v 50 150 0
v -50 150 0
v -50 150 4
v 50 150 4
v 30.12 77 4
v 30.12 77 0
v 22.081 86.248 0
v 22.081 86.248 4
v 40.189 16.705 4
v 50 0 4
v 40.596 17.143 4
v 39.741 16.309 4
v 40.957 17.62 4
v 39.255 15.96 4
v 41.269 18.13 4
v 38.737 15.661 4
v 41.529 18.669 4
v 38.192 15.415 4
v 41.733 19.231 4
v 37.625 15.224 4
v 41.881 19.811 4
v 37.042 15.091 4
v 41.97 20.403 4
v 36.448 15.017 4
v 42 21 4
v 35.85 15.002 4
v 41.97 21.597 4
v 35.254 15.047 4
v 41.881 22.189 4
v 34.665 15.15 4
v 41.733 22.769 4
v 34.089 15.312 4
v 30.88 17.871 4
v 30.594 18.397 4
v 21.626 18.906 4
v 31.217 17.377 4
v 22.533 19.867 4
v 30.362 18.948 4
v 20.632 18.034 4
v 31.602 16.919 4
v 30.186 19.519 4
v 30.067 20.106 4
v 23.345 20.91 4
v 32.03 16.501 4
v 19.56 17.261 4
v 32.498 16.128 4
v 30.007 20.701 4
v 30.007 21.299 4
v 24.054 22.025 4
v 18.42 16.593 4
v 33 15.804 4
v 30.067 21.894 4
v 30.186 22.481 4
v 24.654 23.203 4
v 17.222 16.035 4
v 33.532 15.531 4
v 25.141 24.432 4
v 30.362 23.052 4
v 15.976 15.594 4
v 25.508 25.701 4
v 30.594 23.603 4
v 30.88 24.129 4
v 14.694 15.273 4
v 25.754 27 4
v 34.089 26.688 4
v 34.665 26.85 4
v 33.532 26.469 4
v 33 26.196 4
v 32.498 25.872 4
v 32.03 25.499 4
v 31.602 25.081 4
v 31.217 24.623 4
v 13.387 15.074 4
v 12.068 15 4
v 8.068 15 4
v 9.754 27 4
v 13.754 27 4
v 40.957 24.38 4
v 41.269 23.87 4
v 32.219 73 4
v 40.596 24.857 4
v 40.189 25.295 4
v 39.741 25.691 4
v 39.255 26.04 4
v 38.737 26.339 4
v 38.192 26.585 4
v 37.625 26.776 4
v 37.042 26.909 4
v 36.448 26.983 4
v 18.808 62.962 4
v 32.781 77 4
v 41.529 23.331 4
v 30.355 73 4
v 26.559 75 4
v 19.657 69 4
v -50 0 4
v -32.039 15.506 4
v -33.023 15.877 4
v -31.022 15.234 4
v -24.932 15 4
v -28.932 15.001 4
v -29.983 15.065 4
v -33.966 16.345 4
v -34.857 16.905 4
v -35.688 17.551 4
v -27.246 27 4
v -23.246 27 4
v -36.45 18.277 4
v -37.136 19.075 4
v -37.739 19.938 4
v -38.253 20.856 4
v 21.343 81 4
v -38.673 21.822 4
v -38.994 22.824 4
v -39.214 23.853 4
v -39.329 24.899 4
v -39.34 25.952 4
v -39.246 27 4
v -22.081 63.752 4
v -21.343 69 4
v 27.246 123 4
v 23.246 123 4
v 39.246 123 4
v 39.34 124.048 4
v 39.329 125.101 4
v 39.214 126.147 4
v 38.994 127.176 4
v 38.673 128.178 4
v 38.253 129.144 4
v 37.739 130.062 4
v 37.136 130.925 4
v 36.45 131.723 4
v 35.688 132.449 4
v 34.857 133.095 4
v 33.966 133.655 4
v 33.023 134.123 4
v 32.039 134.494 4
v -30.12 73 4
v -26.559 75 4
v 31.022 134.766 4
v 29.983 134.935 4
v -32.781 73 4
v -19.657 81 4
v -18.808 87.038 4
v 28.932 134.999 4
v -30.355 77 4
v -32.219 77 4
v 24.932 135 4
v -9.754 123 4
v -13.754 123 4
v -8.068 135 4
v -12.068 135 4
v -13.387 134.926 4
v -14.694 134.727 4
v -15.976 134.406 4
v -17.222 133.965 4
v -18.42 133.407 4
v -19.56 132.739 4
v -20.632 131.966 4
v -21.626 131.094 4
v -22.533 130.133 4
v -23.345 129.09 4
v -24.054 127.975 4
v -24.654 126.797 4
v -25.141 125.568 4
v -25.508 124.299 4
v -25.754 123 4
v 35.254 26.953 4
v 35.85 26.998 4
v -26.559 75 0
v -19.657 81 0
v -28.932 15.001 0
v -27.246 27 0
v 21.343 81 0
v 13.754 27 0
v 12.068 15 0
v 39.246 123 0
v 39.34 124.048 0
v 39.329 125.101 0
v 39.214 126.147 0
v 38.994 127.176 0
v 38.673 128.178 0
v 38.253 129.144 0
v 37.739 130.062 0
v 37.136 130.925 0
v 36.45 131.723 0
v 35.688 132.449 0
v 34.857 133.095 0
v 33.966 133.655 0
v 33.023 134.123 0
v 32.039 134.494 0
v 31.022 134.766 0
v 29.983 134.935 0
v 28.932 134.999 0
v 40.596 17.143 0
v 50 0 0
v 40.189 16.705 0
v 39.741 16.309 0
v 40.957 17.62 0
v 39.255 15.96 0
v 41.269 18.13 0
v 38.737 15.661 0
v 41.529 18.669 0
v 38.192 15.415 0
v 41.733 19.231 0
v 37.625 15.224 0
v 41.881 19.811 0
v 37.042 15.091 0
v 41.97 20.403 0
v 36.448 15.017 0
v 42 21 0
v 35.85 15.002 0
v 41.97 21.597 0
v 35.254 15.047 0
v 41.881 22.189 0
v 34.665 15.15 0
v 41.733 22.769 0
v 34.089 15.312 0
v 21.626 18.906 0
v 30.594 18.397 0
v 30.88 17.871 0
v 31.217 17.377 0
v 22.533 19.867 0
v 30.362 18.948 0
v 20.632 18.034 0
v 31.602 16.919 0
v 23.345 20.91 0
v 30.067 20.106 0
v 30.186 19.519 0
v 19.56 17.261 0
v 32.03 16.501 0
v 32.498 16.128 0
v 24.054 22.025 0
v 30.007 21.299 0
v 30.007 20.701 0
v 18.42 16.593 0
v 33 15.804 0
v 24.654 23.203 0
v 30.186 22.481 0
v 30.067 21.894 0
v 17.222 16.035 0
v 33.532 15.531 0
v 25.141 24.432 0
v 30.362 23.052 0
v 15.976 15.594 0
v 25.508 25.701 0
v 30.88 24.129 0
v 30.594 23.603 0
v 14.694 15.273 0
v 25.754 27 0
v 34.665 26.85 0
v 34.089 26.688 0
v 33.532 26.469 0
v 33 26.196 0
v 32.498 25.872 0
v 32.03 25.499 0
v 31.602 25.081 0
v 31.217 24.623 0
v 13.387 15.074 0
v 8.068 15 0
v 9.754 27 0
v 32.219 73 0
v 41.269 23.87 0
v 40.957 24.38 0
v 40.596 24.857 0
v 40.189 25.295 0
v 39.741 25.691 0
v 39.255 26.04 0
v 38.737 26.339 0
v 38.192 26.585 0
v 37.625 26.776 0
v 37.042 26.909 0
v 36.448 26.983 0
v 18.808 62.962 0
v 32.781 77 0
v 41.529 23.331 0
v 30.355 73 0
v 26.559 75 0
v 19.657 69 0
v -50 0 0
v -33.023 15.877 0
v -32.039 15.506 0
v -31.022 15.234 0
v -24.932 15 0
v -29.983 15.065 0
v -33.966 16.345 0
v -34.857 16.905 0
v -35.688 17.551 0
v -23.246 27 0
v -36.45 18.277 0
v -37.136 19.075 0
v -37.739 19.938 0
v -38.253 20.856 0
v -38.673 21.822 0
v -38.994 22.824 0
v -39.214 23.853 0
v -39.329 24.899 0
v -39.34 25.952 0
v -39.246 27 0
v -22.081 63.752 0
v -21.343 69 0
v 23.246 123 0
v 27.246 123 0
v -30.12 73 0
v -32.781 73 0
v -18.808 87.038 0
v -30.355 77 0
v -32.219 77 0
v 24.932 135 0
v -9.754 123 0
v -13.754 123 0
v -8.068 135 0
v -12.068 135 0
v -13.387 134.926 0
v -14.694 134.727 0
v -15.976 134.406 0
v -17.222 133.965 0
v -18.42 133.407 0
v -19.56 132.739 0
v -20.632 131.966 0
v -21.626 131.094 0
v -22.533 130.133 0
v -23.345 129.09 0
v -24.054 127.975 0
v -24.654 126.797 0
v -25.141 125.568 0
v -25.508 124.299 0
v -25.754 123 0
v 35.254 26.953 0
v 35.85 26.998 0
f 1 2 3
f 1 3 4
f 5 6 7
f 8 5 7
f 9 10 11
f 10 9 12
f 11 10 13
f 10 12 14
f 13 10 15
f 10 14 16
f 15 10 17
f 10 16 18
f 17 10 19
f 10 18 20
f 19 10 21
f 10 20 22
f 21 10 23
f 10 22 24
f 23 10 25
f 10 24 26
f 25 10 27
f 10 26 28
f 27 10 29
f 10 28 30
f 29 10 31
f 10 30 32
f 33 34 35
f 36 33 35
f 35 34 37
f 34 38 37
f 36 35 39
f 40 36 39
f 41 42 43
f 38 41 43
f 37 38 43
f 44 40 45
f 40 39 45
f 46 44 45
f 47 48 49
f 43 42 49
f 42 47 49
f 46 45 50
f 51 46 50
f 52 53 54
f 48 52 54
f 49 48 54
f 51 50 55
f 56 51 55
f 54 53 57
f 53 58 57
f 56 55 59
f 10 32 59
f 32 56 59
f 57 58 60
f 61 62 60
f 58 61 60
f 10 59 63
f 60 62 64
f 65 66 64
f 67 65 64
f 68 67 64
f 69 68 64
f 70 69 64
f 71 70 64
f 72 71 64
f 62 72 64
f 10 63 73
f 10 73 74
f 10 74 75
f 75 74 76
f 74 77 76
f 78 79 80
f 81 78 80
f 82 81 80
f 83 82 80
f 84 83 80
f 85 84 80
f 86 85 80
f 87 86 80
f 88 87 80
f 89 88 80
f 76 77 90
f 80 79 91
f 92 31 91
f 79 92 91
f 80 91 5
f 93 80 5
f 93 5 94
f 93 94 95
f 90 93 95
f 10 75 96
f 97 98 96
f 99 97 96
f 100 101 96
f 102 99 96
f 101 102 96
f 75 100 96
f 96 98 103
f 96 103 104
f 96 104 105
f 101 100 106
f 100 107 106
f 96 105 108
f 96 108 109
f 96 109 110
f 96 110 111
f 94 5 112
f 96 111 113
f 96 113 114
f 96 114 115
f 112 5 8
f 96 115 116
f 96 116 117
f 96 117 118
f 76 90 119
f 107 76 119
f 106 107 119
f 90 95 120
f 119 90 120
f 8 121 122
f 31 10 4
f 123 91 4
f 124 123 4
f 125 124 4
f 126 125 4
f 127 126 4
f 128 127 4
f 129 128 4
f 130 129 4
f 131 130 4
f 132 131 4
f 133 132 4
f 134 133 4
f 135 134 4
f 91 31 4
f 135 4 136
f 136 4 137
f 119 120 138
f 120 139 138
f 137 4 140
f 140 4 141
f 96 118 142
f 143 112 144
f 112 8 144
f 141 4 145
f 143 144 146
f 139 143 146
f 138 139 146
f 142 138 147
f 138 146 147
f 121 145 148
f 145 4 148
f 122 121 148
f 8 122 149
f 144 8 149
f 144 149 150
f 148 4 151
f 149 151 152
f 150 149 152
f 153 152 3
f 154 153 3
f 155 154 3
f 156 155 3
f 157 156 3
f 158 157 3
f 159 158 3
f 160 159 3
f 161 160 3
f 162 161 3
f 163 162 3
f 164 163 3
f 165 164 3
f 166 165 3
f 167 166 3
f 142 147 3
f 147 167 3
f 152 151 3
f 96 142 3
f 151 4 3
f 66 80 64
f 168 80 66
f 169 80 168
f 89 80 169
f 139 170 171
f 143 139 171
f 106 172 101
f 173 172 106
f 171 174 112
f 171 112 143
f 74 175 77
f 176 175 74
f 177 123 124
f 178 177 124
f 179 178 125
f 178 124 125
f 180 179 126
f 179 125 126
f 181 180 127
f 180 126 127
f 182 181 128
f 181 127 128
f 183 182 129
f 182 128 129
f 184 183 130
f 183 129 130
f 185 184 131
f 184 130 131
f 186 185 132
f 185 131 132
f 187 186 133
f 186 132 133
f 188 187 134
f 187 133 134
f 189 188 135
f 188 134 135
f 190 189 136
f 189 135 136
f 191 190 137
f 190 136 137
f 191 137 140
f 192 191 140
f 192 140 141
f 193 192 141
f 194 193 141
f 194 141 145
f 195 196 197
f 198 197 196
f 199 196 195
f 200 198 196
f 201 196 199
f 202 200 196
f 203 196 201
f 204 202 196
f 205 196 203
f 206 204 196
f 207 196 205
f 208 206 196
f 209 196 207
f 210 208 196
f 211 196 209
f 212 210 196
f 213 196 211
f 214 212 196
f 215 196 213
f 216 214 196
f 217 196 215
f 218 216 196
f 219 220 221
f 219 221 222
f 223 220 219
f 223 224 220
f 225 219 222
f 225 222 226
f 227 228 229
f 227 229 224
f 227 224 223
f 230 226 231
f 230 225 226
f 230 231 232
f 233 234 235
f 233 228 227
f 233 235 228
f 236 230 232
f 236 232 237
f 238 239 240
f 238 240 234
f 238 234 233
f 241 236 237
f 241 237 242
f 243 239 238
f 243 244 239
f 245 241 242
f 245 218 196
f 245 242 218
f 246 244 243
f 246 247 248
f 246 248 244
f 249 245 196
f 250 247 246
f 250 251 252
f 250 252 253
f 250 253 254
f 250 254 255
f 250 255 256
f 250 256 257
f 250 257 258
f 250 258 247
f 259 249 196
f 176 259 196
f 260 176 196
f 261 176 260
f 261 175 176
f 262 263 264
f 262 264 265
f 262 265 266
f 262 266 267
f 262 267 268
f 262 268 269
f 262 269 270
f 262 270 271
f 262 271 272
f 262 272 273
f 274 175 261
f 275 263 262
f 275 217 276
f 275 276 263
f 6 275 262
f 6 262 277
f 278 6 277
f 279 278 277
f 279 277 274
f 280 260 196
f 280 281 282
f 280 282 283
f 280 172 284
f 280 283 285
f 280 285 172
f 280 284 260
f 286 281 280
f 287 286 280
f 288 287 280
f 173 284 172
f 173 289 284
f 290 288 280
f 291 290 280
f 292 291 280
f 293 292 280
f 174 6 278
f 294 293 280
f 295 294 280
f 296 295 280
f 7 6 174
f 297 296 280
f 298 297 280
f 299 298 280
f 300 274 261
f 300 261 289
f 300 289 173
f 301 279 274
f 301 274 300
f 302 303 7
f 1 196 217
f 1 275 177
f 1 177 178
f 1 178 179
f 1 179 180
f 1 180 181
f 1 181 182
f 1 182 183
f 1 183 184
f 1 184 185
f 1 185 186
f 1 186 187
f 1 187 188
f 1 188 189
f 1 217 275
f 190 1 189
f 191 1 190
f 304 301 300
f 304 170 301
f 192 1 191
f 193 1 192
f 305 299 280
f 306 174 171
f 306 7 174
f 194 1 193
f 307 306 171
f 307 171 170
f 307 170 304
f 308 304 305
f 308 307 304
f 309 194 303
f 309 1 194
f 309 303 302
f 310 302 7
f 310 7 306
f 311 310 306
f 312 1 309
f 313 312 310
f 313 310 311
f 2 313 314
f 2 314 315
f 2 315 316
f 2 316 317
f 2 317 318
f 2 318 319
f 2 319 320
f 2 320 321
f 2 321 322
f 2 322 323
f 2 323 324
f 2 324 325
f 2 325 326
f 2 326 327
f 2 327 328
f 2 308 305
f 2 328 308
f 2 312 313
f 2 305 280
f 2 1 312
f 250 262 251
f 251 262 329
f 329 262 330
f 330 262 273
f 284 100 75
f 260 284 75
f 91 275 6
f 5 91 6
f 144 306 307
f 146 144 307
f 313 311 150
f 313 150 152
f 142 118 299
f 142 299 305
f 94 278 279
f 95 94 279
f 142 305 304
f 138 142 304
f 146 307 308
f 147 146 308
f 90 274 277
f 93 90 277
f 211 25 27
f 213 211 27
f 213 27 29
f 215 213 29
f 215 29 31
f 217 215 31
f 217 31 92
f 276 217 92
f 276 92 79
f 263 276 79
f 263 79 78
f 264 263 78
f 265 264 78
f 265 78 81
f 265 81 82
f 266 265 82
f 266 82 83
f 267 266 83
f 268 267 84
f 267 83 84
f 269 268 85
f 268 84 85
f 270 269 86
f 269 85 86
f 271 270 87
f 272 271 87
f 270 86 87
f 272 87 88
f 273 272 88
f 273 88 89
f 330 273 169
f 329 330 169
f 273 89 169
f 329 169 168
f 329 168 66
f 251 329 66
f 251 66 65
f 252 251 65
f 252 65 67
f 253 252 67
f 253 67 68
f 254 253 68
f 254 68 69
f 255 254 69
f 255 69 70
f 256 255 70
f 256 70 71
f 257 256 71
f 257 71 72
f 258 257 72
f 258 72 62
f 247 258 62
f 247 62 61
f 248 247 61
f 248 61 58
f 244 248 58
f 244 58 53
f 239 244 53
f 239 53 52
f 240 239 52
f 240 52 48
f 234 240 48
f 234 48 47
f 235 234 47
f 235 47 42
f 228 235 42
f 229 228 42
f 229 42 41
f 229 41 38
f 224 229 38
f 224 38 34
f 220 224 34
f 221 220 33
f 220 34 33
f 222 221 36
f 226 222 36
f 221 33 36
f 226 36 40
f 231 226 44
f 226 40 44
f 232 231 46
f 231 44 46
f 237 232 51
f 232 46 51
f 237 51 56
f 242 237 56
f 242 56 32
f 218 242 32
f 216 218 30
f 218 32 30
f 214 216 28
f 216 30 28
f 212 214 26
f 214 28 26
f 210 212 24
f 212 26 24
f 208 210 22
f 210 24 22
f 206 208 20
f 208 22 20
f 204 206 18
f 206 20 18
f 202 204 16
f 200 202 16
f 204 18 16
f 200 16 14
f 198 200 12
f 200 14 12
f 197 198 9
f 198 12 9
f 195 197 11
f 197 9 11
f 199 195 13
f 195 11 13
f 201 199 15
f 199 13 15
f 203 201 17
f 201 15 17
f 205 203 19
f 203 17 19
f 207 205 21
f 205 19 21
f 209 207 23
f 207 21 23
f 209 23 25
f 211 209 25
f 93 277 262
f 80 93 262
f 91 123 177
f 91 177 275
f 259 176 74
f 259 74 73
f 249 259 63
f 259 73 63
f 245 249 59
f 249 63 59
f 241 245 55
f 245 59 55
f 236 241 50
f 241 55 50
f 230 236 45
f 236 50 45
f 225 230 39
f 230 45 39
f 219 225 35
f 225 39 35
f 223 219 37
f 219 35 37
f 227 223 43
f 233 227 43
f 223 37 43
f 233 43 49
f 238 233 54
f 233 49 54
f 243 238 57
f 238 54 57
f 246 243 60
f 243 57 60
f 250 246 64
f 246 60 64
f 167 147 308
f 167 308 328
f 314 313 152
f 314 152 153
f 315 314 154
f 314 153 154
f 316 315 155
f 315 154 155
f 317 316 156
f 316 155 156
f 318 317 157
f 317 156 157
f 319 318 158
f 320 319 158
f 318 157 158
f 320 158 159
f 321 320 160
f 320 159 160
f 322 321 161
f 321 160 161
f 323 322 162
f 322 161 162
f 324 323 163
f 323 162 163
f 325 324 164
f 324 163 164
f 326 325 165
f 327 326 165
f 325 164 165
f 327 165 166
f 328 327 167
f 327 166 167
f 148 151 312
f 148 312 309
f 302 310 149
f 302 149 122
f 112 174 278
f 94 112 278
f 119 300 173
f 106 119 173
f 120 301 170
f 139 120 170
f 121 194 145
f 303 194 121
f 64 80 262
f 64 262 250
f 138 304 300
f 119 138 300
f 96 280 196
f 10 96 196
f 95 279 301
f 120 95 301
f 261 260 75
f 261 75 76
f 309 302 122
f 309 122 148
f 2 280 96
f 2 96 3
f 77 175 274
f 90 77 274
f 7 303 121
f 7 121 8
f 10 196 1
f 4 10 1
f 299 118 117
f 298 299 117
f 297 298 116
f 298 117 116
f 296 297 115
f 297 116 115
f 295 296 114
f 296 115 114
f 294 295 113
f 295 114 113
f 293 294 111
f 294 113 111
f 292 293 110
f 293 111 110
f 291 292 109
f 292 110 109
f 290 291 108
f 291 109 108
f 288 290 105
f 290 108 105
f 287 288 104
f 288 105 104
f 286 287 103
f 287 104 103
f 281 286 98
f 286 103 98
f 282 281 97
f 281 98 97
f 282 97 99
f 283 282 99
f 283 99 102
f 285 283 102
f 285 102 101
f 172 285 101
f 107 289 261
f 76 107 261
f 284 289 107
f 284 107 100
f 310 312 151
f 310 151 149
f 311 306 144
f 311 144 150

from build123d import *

# Parameters (mm, degrees)
PAD002_DEPTH    = 4
SKETCH_W        = 100
SKETCH_H        = 150
PAD_DEPTH       = 4
POCKET_DEPTH    = 5
SKETCH002_R     = 6
POCKET001_DEPTH = 5
PAD001_DEPTH    = 4
PAD003_DEPTH    = 4


with BuildPart() as pad002:
    # Sketch004 → Pad002 (new body)
    with BuildSketch(Plane.XY):
        Polygon((-28.9324500821, 15), (-27.2459600657, 27), (-23.2459600657, 27), (-24.9324500821, 15), align=None)
        Polygon((13.7540399343, 27), (12.0675499179, 15), (8.0675499179, 15), (9.7540399343, 27), align=None)
        Polygon((-13.7540399343, 123), (-12.0675499179, 135), (-8.0675499179, 135), (-9.7540399343, 123), align=None)
        Polygon((28.9324500821, 135), (27.2459600657, 123), (23.2459600657, 123), (24.9324500821, 135), align=None)
    extrude(amount=PAD002_DEPTH)


with BuildPart() as pocket001:
    # Sketch → Pad (new body)
    with BuildSketch(Plane.XY):
        with Locations((0, 75)):
            Rectangle(SKETCH_W, SKETCH_H)
    extrude(amount=PAD_DEPTH)

    # Sketch001 → Pocket (cut)
    with BuildSketch(Plane.XY.offset(4)):
        with BuildLine():
            Line((-39.2459600657, 27), (-25.7540399343, 123))
            ThreePointArc((-11.9496190476, 135), (-21.0951375679, 131.5806307393), (-25.7540399343, 123))
            Line((-11.9496190476, 135), (28.8145192119, 135))
            ThreePointArc((39.2459600657, 123), (36.764597172, 131.3769407401), (28.8145192119, 135))
            Line((39.2459600657, 123), (25.7540399343, 27))
            ThreePointArc((11.9496190476, 15), (21.0951375679, 18.4193692607), (25.7540399343, 27))
            Line((-28.8145192119, 15), (11.9496190476, 15))
            ThreePointArc((-39.2459600657, 27), (-36.764597172, 18.6230592599), (-28.8145192119, 15))
        make_face()
    extrude(amount=-POCKET_DEPTH, mode=Mode.SUBTRACT)

    # Sketch002 → Pocket001 (cut)
    with BuildSketch(Plane.XY.offset(4)):
        with Locations((36, 21)):
            Circle(SKETCH002_R)
    extrude(amount=-POCKET001_DEPTH, mode=Mode.SUBTRACT)


with BuildPart() as pad001:
    # Sketch003 → Pad001 (new body)
    with BuildSketch(Plane.XY):
        Polygon((-27.2459600657, 27), (13.7540399343, 27), (19.6567549918, 69), (-21.3432450082, 69), align=None)
        Polygon((-13.7540399343, 123), (27.2459600657, 123), (21.3432450082, 81), (-19.6567549918, 81), align=None)
    extrude(amount=PAD001_DEPTH)


with BuildPart() as fusion:
    # Sketch005 → Pad003 (new body)
    with BuildSketch(Plane.XY):
        Polygon((-21.3432450082, 69), (-26.5589654351, 75), (-19.6567549918, 81), (-18.8082148769, 87.0376766418), (-30.3552409675, 77), (-32.3368492008, 77), (-32.8990125396, 73), (-30.1204439329, 73), (-22.0808696766, 63.7515277681), align=None)
        Polygon((21.3432450082, 81), (26.5589654351, 75), (19.6567549918, 69), (18.8082148769, 62.9623233582), (30.3552409675, 73), (32.3368492008, 73), (32.8990125396, 77), (30.1204439329, 77), (22.0808696766, 86.2484722319), align=None)
    extrude(amount=PAD003_DEPTH)

    # Fusion: union Pad002, Pocket001, Pad001
    add(pad002.part)
    add(pocket001.part)
    add(pad001.part)


solid = fusion.part
